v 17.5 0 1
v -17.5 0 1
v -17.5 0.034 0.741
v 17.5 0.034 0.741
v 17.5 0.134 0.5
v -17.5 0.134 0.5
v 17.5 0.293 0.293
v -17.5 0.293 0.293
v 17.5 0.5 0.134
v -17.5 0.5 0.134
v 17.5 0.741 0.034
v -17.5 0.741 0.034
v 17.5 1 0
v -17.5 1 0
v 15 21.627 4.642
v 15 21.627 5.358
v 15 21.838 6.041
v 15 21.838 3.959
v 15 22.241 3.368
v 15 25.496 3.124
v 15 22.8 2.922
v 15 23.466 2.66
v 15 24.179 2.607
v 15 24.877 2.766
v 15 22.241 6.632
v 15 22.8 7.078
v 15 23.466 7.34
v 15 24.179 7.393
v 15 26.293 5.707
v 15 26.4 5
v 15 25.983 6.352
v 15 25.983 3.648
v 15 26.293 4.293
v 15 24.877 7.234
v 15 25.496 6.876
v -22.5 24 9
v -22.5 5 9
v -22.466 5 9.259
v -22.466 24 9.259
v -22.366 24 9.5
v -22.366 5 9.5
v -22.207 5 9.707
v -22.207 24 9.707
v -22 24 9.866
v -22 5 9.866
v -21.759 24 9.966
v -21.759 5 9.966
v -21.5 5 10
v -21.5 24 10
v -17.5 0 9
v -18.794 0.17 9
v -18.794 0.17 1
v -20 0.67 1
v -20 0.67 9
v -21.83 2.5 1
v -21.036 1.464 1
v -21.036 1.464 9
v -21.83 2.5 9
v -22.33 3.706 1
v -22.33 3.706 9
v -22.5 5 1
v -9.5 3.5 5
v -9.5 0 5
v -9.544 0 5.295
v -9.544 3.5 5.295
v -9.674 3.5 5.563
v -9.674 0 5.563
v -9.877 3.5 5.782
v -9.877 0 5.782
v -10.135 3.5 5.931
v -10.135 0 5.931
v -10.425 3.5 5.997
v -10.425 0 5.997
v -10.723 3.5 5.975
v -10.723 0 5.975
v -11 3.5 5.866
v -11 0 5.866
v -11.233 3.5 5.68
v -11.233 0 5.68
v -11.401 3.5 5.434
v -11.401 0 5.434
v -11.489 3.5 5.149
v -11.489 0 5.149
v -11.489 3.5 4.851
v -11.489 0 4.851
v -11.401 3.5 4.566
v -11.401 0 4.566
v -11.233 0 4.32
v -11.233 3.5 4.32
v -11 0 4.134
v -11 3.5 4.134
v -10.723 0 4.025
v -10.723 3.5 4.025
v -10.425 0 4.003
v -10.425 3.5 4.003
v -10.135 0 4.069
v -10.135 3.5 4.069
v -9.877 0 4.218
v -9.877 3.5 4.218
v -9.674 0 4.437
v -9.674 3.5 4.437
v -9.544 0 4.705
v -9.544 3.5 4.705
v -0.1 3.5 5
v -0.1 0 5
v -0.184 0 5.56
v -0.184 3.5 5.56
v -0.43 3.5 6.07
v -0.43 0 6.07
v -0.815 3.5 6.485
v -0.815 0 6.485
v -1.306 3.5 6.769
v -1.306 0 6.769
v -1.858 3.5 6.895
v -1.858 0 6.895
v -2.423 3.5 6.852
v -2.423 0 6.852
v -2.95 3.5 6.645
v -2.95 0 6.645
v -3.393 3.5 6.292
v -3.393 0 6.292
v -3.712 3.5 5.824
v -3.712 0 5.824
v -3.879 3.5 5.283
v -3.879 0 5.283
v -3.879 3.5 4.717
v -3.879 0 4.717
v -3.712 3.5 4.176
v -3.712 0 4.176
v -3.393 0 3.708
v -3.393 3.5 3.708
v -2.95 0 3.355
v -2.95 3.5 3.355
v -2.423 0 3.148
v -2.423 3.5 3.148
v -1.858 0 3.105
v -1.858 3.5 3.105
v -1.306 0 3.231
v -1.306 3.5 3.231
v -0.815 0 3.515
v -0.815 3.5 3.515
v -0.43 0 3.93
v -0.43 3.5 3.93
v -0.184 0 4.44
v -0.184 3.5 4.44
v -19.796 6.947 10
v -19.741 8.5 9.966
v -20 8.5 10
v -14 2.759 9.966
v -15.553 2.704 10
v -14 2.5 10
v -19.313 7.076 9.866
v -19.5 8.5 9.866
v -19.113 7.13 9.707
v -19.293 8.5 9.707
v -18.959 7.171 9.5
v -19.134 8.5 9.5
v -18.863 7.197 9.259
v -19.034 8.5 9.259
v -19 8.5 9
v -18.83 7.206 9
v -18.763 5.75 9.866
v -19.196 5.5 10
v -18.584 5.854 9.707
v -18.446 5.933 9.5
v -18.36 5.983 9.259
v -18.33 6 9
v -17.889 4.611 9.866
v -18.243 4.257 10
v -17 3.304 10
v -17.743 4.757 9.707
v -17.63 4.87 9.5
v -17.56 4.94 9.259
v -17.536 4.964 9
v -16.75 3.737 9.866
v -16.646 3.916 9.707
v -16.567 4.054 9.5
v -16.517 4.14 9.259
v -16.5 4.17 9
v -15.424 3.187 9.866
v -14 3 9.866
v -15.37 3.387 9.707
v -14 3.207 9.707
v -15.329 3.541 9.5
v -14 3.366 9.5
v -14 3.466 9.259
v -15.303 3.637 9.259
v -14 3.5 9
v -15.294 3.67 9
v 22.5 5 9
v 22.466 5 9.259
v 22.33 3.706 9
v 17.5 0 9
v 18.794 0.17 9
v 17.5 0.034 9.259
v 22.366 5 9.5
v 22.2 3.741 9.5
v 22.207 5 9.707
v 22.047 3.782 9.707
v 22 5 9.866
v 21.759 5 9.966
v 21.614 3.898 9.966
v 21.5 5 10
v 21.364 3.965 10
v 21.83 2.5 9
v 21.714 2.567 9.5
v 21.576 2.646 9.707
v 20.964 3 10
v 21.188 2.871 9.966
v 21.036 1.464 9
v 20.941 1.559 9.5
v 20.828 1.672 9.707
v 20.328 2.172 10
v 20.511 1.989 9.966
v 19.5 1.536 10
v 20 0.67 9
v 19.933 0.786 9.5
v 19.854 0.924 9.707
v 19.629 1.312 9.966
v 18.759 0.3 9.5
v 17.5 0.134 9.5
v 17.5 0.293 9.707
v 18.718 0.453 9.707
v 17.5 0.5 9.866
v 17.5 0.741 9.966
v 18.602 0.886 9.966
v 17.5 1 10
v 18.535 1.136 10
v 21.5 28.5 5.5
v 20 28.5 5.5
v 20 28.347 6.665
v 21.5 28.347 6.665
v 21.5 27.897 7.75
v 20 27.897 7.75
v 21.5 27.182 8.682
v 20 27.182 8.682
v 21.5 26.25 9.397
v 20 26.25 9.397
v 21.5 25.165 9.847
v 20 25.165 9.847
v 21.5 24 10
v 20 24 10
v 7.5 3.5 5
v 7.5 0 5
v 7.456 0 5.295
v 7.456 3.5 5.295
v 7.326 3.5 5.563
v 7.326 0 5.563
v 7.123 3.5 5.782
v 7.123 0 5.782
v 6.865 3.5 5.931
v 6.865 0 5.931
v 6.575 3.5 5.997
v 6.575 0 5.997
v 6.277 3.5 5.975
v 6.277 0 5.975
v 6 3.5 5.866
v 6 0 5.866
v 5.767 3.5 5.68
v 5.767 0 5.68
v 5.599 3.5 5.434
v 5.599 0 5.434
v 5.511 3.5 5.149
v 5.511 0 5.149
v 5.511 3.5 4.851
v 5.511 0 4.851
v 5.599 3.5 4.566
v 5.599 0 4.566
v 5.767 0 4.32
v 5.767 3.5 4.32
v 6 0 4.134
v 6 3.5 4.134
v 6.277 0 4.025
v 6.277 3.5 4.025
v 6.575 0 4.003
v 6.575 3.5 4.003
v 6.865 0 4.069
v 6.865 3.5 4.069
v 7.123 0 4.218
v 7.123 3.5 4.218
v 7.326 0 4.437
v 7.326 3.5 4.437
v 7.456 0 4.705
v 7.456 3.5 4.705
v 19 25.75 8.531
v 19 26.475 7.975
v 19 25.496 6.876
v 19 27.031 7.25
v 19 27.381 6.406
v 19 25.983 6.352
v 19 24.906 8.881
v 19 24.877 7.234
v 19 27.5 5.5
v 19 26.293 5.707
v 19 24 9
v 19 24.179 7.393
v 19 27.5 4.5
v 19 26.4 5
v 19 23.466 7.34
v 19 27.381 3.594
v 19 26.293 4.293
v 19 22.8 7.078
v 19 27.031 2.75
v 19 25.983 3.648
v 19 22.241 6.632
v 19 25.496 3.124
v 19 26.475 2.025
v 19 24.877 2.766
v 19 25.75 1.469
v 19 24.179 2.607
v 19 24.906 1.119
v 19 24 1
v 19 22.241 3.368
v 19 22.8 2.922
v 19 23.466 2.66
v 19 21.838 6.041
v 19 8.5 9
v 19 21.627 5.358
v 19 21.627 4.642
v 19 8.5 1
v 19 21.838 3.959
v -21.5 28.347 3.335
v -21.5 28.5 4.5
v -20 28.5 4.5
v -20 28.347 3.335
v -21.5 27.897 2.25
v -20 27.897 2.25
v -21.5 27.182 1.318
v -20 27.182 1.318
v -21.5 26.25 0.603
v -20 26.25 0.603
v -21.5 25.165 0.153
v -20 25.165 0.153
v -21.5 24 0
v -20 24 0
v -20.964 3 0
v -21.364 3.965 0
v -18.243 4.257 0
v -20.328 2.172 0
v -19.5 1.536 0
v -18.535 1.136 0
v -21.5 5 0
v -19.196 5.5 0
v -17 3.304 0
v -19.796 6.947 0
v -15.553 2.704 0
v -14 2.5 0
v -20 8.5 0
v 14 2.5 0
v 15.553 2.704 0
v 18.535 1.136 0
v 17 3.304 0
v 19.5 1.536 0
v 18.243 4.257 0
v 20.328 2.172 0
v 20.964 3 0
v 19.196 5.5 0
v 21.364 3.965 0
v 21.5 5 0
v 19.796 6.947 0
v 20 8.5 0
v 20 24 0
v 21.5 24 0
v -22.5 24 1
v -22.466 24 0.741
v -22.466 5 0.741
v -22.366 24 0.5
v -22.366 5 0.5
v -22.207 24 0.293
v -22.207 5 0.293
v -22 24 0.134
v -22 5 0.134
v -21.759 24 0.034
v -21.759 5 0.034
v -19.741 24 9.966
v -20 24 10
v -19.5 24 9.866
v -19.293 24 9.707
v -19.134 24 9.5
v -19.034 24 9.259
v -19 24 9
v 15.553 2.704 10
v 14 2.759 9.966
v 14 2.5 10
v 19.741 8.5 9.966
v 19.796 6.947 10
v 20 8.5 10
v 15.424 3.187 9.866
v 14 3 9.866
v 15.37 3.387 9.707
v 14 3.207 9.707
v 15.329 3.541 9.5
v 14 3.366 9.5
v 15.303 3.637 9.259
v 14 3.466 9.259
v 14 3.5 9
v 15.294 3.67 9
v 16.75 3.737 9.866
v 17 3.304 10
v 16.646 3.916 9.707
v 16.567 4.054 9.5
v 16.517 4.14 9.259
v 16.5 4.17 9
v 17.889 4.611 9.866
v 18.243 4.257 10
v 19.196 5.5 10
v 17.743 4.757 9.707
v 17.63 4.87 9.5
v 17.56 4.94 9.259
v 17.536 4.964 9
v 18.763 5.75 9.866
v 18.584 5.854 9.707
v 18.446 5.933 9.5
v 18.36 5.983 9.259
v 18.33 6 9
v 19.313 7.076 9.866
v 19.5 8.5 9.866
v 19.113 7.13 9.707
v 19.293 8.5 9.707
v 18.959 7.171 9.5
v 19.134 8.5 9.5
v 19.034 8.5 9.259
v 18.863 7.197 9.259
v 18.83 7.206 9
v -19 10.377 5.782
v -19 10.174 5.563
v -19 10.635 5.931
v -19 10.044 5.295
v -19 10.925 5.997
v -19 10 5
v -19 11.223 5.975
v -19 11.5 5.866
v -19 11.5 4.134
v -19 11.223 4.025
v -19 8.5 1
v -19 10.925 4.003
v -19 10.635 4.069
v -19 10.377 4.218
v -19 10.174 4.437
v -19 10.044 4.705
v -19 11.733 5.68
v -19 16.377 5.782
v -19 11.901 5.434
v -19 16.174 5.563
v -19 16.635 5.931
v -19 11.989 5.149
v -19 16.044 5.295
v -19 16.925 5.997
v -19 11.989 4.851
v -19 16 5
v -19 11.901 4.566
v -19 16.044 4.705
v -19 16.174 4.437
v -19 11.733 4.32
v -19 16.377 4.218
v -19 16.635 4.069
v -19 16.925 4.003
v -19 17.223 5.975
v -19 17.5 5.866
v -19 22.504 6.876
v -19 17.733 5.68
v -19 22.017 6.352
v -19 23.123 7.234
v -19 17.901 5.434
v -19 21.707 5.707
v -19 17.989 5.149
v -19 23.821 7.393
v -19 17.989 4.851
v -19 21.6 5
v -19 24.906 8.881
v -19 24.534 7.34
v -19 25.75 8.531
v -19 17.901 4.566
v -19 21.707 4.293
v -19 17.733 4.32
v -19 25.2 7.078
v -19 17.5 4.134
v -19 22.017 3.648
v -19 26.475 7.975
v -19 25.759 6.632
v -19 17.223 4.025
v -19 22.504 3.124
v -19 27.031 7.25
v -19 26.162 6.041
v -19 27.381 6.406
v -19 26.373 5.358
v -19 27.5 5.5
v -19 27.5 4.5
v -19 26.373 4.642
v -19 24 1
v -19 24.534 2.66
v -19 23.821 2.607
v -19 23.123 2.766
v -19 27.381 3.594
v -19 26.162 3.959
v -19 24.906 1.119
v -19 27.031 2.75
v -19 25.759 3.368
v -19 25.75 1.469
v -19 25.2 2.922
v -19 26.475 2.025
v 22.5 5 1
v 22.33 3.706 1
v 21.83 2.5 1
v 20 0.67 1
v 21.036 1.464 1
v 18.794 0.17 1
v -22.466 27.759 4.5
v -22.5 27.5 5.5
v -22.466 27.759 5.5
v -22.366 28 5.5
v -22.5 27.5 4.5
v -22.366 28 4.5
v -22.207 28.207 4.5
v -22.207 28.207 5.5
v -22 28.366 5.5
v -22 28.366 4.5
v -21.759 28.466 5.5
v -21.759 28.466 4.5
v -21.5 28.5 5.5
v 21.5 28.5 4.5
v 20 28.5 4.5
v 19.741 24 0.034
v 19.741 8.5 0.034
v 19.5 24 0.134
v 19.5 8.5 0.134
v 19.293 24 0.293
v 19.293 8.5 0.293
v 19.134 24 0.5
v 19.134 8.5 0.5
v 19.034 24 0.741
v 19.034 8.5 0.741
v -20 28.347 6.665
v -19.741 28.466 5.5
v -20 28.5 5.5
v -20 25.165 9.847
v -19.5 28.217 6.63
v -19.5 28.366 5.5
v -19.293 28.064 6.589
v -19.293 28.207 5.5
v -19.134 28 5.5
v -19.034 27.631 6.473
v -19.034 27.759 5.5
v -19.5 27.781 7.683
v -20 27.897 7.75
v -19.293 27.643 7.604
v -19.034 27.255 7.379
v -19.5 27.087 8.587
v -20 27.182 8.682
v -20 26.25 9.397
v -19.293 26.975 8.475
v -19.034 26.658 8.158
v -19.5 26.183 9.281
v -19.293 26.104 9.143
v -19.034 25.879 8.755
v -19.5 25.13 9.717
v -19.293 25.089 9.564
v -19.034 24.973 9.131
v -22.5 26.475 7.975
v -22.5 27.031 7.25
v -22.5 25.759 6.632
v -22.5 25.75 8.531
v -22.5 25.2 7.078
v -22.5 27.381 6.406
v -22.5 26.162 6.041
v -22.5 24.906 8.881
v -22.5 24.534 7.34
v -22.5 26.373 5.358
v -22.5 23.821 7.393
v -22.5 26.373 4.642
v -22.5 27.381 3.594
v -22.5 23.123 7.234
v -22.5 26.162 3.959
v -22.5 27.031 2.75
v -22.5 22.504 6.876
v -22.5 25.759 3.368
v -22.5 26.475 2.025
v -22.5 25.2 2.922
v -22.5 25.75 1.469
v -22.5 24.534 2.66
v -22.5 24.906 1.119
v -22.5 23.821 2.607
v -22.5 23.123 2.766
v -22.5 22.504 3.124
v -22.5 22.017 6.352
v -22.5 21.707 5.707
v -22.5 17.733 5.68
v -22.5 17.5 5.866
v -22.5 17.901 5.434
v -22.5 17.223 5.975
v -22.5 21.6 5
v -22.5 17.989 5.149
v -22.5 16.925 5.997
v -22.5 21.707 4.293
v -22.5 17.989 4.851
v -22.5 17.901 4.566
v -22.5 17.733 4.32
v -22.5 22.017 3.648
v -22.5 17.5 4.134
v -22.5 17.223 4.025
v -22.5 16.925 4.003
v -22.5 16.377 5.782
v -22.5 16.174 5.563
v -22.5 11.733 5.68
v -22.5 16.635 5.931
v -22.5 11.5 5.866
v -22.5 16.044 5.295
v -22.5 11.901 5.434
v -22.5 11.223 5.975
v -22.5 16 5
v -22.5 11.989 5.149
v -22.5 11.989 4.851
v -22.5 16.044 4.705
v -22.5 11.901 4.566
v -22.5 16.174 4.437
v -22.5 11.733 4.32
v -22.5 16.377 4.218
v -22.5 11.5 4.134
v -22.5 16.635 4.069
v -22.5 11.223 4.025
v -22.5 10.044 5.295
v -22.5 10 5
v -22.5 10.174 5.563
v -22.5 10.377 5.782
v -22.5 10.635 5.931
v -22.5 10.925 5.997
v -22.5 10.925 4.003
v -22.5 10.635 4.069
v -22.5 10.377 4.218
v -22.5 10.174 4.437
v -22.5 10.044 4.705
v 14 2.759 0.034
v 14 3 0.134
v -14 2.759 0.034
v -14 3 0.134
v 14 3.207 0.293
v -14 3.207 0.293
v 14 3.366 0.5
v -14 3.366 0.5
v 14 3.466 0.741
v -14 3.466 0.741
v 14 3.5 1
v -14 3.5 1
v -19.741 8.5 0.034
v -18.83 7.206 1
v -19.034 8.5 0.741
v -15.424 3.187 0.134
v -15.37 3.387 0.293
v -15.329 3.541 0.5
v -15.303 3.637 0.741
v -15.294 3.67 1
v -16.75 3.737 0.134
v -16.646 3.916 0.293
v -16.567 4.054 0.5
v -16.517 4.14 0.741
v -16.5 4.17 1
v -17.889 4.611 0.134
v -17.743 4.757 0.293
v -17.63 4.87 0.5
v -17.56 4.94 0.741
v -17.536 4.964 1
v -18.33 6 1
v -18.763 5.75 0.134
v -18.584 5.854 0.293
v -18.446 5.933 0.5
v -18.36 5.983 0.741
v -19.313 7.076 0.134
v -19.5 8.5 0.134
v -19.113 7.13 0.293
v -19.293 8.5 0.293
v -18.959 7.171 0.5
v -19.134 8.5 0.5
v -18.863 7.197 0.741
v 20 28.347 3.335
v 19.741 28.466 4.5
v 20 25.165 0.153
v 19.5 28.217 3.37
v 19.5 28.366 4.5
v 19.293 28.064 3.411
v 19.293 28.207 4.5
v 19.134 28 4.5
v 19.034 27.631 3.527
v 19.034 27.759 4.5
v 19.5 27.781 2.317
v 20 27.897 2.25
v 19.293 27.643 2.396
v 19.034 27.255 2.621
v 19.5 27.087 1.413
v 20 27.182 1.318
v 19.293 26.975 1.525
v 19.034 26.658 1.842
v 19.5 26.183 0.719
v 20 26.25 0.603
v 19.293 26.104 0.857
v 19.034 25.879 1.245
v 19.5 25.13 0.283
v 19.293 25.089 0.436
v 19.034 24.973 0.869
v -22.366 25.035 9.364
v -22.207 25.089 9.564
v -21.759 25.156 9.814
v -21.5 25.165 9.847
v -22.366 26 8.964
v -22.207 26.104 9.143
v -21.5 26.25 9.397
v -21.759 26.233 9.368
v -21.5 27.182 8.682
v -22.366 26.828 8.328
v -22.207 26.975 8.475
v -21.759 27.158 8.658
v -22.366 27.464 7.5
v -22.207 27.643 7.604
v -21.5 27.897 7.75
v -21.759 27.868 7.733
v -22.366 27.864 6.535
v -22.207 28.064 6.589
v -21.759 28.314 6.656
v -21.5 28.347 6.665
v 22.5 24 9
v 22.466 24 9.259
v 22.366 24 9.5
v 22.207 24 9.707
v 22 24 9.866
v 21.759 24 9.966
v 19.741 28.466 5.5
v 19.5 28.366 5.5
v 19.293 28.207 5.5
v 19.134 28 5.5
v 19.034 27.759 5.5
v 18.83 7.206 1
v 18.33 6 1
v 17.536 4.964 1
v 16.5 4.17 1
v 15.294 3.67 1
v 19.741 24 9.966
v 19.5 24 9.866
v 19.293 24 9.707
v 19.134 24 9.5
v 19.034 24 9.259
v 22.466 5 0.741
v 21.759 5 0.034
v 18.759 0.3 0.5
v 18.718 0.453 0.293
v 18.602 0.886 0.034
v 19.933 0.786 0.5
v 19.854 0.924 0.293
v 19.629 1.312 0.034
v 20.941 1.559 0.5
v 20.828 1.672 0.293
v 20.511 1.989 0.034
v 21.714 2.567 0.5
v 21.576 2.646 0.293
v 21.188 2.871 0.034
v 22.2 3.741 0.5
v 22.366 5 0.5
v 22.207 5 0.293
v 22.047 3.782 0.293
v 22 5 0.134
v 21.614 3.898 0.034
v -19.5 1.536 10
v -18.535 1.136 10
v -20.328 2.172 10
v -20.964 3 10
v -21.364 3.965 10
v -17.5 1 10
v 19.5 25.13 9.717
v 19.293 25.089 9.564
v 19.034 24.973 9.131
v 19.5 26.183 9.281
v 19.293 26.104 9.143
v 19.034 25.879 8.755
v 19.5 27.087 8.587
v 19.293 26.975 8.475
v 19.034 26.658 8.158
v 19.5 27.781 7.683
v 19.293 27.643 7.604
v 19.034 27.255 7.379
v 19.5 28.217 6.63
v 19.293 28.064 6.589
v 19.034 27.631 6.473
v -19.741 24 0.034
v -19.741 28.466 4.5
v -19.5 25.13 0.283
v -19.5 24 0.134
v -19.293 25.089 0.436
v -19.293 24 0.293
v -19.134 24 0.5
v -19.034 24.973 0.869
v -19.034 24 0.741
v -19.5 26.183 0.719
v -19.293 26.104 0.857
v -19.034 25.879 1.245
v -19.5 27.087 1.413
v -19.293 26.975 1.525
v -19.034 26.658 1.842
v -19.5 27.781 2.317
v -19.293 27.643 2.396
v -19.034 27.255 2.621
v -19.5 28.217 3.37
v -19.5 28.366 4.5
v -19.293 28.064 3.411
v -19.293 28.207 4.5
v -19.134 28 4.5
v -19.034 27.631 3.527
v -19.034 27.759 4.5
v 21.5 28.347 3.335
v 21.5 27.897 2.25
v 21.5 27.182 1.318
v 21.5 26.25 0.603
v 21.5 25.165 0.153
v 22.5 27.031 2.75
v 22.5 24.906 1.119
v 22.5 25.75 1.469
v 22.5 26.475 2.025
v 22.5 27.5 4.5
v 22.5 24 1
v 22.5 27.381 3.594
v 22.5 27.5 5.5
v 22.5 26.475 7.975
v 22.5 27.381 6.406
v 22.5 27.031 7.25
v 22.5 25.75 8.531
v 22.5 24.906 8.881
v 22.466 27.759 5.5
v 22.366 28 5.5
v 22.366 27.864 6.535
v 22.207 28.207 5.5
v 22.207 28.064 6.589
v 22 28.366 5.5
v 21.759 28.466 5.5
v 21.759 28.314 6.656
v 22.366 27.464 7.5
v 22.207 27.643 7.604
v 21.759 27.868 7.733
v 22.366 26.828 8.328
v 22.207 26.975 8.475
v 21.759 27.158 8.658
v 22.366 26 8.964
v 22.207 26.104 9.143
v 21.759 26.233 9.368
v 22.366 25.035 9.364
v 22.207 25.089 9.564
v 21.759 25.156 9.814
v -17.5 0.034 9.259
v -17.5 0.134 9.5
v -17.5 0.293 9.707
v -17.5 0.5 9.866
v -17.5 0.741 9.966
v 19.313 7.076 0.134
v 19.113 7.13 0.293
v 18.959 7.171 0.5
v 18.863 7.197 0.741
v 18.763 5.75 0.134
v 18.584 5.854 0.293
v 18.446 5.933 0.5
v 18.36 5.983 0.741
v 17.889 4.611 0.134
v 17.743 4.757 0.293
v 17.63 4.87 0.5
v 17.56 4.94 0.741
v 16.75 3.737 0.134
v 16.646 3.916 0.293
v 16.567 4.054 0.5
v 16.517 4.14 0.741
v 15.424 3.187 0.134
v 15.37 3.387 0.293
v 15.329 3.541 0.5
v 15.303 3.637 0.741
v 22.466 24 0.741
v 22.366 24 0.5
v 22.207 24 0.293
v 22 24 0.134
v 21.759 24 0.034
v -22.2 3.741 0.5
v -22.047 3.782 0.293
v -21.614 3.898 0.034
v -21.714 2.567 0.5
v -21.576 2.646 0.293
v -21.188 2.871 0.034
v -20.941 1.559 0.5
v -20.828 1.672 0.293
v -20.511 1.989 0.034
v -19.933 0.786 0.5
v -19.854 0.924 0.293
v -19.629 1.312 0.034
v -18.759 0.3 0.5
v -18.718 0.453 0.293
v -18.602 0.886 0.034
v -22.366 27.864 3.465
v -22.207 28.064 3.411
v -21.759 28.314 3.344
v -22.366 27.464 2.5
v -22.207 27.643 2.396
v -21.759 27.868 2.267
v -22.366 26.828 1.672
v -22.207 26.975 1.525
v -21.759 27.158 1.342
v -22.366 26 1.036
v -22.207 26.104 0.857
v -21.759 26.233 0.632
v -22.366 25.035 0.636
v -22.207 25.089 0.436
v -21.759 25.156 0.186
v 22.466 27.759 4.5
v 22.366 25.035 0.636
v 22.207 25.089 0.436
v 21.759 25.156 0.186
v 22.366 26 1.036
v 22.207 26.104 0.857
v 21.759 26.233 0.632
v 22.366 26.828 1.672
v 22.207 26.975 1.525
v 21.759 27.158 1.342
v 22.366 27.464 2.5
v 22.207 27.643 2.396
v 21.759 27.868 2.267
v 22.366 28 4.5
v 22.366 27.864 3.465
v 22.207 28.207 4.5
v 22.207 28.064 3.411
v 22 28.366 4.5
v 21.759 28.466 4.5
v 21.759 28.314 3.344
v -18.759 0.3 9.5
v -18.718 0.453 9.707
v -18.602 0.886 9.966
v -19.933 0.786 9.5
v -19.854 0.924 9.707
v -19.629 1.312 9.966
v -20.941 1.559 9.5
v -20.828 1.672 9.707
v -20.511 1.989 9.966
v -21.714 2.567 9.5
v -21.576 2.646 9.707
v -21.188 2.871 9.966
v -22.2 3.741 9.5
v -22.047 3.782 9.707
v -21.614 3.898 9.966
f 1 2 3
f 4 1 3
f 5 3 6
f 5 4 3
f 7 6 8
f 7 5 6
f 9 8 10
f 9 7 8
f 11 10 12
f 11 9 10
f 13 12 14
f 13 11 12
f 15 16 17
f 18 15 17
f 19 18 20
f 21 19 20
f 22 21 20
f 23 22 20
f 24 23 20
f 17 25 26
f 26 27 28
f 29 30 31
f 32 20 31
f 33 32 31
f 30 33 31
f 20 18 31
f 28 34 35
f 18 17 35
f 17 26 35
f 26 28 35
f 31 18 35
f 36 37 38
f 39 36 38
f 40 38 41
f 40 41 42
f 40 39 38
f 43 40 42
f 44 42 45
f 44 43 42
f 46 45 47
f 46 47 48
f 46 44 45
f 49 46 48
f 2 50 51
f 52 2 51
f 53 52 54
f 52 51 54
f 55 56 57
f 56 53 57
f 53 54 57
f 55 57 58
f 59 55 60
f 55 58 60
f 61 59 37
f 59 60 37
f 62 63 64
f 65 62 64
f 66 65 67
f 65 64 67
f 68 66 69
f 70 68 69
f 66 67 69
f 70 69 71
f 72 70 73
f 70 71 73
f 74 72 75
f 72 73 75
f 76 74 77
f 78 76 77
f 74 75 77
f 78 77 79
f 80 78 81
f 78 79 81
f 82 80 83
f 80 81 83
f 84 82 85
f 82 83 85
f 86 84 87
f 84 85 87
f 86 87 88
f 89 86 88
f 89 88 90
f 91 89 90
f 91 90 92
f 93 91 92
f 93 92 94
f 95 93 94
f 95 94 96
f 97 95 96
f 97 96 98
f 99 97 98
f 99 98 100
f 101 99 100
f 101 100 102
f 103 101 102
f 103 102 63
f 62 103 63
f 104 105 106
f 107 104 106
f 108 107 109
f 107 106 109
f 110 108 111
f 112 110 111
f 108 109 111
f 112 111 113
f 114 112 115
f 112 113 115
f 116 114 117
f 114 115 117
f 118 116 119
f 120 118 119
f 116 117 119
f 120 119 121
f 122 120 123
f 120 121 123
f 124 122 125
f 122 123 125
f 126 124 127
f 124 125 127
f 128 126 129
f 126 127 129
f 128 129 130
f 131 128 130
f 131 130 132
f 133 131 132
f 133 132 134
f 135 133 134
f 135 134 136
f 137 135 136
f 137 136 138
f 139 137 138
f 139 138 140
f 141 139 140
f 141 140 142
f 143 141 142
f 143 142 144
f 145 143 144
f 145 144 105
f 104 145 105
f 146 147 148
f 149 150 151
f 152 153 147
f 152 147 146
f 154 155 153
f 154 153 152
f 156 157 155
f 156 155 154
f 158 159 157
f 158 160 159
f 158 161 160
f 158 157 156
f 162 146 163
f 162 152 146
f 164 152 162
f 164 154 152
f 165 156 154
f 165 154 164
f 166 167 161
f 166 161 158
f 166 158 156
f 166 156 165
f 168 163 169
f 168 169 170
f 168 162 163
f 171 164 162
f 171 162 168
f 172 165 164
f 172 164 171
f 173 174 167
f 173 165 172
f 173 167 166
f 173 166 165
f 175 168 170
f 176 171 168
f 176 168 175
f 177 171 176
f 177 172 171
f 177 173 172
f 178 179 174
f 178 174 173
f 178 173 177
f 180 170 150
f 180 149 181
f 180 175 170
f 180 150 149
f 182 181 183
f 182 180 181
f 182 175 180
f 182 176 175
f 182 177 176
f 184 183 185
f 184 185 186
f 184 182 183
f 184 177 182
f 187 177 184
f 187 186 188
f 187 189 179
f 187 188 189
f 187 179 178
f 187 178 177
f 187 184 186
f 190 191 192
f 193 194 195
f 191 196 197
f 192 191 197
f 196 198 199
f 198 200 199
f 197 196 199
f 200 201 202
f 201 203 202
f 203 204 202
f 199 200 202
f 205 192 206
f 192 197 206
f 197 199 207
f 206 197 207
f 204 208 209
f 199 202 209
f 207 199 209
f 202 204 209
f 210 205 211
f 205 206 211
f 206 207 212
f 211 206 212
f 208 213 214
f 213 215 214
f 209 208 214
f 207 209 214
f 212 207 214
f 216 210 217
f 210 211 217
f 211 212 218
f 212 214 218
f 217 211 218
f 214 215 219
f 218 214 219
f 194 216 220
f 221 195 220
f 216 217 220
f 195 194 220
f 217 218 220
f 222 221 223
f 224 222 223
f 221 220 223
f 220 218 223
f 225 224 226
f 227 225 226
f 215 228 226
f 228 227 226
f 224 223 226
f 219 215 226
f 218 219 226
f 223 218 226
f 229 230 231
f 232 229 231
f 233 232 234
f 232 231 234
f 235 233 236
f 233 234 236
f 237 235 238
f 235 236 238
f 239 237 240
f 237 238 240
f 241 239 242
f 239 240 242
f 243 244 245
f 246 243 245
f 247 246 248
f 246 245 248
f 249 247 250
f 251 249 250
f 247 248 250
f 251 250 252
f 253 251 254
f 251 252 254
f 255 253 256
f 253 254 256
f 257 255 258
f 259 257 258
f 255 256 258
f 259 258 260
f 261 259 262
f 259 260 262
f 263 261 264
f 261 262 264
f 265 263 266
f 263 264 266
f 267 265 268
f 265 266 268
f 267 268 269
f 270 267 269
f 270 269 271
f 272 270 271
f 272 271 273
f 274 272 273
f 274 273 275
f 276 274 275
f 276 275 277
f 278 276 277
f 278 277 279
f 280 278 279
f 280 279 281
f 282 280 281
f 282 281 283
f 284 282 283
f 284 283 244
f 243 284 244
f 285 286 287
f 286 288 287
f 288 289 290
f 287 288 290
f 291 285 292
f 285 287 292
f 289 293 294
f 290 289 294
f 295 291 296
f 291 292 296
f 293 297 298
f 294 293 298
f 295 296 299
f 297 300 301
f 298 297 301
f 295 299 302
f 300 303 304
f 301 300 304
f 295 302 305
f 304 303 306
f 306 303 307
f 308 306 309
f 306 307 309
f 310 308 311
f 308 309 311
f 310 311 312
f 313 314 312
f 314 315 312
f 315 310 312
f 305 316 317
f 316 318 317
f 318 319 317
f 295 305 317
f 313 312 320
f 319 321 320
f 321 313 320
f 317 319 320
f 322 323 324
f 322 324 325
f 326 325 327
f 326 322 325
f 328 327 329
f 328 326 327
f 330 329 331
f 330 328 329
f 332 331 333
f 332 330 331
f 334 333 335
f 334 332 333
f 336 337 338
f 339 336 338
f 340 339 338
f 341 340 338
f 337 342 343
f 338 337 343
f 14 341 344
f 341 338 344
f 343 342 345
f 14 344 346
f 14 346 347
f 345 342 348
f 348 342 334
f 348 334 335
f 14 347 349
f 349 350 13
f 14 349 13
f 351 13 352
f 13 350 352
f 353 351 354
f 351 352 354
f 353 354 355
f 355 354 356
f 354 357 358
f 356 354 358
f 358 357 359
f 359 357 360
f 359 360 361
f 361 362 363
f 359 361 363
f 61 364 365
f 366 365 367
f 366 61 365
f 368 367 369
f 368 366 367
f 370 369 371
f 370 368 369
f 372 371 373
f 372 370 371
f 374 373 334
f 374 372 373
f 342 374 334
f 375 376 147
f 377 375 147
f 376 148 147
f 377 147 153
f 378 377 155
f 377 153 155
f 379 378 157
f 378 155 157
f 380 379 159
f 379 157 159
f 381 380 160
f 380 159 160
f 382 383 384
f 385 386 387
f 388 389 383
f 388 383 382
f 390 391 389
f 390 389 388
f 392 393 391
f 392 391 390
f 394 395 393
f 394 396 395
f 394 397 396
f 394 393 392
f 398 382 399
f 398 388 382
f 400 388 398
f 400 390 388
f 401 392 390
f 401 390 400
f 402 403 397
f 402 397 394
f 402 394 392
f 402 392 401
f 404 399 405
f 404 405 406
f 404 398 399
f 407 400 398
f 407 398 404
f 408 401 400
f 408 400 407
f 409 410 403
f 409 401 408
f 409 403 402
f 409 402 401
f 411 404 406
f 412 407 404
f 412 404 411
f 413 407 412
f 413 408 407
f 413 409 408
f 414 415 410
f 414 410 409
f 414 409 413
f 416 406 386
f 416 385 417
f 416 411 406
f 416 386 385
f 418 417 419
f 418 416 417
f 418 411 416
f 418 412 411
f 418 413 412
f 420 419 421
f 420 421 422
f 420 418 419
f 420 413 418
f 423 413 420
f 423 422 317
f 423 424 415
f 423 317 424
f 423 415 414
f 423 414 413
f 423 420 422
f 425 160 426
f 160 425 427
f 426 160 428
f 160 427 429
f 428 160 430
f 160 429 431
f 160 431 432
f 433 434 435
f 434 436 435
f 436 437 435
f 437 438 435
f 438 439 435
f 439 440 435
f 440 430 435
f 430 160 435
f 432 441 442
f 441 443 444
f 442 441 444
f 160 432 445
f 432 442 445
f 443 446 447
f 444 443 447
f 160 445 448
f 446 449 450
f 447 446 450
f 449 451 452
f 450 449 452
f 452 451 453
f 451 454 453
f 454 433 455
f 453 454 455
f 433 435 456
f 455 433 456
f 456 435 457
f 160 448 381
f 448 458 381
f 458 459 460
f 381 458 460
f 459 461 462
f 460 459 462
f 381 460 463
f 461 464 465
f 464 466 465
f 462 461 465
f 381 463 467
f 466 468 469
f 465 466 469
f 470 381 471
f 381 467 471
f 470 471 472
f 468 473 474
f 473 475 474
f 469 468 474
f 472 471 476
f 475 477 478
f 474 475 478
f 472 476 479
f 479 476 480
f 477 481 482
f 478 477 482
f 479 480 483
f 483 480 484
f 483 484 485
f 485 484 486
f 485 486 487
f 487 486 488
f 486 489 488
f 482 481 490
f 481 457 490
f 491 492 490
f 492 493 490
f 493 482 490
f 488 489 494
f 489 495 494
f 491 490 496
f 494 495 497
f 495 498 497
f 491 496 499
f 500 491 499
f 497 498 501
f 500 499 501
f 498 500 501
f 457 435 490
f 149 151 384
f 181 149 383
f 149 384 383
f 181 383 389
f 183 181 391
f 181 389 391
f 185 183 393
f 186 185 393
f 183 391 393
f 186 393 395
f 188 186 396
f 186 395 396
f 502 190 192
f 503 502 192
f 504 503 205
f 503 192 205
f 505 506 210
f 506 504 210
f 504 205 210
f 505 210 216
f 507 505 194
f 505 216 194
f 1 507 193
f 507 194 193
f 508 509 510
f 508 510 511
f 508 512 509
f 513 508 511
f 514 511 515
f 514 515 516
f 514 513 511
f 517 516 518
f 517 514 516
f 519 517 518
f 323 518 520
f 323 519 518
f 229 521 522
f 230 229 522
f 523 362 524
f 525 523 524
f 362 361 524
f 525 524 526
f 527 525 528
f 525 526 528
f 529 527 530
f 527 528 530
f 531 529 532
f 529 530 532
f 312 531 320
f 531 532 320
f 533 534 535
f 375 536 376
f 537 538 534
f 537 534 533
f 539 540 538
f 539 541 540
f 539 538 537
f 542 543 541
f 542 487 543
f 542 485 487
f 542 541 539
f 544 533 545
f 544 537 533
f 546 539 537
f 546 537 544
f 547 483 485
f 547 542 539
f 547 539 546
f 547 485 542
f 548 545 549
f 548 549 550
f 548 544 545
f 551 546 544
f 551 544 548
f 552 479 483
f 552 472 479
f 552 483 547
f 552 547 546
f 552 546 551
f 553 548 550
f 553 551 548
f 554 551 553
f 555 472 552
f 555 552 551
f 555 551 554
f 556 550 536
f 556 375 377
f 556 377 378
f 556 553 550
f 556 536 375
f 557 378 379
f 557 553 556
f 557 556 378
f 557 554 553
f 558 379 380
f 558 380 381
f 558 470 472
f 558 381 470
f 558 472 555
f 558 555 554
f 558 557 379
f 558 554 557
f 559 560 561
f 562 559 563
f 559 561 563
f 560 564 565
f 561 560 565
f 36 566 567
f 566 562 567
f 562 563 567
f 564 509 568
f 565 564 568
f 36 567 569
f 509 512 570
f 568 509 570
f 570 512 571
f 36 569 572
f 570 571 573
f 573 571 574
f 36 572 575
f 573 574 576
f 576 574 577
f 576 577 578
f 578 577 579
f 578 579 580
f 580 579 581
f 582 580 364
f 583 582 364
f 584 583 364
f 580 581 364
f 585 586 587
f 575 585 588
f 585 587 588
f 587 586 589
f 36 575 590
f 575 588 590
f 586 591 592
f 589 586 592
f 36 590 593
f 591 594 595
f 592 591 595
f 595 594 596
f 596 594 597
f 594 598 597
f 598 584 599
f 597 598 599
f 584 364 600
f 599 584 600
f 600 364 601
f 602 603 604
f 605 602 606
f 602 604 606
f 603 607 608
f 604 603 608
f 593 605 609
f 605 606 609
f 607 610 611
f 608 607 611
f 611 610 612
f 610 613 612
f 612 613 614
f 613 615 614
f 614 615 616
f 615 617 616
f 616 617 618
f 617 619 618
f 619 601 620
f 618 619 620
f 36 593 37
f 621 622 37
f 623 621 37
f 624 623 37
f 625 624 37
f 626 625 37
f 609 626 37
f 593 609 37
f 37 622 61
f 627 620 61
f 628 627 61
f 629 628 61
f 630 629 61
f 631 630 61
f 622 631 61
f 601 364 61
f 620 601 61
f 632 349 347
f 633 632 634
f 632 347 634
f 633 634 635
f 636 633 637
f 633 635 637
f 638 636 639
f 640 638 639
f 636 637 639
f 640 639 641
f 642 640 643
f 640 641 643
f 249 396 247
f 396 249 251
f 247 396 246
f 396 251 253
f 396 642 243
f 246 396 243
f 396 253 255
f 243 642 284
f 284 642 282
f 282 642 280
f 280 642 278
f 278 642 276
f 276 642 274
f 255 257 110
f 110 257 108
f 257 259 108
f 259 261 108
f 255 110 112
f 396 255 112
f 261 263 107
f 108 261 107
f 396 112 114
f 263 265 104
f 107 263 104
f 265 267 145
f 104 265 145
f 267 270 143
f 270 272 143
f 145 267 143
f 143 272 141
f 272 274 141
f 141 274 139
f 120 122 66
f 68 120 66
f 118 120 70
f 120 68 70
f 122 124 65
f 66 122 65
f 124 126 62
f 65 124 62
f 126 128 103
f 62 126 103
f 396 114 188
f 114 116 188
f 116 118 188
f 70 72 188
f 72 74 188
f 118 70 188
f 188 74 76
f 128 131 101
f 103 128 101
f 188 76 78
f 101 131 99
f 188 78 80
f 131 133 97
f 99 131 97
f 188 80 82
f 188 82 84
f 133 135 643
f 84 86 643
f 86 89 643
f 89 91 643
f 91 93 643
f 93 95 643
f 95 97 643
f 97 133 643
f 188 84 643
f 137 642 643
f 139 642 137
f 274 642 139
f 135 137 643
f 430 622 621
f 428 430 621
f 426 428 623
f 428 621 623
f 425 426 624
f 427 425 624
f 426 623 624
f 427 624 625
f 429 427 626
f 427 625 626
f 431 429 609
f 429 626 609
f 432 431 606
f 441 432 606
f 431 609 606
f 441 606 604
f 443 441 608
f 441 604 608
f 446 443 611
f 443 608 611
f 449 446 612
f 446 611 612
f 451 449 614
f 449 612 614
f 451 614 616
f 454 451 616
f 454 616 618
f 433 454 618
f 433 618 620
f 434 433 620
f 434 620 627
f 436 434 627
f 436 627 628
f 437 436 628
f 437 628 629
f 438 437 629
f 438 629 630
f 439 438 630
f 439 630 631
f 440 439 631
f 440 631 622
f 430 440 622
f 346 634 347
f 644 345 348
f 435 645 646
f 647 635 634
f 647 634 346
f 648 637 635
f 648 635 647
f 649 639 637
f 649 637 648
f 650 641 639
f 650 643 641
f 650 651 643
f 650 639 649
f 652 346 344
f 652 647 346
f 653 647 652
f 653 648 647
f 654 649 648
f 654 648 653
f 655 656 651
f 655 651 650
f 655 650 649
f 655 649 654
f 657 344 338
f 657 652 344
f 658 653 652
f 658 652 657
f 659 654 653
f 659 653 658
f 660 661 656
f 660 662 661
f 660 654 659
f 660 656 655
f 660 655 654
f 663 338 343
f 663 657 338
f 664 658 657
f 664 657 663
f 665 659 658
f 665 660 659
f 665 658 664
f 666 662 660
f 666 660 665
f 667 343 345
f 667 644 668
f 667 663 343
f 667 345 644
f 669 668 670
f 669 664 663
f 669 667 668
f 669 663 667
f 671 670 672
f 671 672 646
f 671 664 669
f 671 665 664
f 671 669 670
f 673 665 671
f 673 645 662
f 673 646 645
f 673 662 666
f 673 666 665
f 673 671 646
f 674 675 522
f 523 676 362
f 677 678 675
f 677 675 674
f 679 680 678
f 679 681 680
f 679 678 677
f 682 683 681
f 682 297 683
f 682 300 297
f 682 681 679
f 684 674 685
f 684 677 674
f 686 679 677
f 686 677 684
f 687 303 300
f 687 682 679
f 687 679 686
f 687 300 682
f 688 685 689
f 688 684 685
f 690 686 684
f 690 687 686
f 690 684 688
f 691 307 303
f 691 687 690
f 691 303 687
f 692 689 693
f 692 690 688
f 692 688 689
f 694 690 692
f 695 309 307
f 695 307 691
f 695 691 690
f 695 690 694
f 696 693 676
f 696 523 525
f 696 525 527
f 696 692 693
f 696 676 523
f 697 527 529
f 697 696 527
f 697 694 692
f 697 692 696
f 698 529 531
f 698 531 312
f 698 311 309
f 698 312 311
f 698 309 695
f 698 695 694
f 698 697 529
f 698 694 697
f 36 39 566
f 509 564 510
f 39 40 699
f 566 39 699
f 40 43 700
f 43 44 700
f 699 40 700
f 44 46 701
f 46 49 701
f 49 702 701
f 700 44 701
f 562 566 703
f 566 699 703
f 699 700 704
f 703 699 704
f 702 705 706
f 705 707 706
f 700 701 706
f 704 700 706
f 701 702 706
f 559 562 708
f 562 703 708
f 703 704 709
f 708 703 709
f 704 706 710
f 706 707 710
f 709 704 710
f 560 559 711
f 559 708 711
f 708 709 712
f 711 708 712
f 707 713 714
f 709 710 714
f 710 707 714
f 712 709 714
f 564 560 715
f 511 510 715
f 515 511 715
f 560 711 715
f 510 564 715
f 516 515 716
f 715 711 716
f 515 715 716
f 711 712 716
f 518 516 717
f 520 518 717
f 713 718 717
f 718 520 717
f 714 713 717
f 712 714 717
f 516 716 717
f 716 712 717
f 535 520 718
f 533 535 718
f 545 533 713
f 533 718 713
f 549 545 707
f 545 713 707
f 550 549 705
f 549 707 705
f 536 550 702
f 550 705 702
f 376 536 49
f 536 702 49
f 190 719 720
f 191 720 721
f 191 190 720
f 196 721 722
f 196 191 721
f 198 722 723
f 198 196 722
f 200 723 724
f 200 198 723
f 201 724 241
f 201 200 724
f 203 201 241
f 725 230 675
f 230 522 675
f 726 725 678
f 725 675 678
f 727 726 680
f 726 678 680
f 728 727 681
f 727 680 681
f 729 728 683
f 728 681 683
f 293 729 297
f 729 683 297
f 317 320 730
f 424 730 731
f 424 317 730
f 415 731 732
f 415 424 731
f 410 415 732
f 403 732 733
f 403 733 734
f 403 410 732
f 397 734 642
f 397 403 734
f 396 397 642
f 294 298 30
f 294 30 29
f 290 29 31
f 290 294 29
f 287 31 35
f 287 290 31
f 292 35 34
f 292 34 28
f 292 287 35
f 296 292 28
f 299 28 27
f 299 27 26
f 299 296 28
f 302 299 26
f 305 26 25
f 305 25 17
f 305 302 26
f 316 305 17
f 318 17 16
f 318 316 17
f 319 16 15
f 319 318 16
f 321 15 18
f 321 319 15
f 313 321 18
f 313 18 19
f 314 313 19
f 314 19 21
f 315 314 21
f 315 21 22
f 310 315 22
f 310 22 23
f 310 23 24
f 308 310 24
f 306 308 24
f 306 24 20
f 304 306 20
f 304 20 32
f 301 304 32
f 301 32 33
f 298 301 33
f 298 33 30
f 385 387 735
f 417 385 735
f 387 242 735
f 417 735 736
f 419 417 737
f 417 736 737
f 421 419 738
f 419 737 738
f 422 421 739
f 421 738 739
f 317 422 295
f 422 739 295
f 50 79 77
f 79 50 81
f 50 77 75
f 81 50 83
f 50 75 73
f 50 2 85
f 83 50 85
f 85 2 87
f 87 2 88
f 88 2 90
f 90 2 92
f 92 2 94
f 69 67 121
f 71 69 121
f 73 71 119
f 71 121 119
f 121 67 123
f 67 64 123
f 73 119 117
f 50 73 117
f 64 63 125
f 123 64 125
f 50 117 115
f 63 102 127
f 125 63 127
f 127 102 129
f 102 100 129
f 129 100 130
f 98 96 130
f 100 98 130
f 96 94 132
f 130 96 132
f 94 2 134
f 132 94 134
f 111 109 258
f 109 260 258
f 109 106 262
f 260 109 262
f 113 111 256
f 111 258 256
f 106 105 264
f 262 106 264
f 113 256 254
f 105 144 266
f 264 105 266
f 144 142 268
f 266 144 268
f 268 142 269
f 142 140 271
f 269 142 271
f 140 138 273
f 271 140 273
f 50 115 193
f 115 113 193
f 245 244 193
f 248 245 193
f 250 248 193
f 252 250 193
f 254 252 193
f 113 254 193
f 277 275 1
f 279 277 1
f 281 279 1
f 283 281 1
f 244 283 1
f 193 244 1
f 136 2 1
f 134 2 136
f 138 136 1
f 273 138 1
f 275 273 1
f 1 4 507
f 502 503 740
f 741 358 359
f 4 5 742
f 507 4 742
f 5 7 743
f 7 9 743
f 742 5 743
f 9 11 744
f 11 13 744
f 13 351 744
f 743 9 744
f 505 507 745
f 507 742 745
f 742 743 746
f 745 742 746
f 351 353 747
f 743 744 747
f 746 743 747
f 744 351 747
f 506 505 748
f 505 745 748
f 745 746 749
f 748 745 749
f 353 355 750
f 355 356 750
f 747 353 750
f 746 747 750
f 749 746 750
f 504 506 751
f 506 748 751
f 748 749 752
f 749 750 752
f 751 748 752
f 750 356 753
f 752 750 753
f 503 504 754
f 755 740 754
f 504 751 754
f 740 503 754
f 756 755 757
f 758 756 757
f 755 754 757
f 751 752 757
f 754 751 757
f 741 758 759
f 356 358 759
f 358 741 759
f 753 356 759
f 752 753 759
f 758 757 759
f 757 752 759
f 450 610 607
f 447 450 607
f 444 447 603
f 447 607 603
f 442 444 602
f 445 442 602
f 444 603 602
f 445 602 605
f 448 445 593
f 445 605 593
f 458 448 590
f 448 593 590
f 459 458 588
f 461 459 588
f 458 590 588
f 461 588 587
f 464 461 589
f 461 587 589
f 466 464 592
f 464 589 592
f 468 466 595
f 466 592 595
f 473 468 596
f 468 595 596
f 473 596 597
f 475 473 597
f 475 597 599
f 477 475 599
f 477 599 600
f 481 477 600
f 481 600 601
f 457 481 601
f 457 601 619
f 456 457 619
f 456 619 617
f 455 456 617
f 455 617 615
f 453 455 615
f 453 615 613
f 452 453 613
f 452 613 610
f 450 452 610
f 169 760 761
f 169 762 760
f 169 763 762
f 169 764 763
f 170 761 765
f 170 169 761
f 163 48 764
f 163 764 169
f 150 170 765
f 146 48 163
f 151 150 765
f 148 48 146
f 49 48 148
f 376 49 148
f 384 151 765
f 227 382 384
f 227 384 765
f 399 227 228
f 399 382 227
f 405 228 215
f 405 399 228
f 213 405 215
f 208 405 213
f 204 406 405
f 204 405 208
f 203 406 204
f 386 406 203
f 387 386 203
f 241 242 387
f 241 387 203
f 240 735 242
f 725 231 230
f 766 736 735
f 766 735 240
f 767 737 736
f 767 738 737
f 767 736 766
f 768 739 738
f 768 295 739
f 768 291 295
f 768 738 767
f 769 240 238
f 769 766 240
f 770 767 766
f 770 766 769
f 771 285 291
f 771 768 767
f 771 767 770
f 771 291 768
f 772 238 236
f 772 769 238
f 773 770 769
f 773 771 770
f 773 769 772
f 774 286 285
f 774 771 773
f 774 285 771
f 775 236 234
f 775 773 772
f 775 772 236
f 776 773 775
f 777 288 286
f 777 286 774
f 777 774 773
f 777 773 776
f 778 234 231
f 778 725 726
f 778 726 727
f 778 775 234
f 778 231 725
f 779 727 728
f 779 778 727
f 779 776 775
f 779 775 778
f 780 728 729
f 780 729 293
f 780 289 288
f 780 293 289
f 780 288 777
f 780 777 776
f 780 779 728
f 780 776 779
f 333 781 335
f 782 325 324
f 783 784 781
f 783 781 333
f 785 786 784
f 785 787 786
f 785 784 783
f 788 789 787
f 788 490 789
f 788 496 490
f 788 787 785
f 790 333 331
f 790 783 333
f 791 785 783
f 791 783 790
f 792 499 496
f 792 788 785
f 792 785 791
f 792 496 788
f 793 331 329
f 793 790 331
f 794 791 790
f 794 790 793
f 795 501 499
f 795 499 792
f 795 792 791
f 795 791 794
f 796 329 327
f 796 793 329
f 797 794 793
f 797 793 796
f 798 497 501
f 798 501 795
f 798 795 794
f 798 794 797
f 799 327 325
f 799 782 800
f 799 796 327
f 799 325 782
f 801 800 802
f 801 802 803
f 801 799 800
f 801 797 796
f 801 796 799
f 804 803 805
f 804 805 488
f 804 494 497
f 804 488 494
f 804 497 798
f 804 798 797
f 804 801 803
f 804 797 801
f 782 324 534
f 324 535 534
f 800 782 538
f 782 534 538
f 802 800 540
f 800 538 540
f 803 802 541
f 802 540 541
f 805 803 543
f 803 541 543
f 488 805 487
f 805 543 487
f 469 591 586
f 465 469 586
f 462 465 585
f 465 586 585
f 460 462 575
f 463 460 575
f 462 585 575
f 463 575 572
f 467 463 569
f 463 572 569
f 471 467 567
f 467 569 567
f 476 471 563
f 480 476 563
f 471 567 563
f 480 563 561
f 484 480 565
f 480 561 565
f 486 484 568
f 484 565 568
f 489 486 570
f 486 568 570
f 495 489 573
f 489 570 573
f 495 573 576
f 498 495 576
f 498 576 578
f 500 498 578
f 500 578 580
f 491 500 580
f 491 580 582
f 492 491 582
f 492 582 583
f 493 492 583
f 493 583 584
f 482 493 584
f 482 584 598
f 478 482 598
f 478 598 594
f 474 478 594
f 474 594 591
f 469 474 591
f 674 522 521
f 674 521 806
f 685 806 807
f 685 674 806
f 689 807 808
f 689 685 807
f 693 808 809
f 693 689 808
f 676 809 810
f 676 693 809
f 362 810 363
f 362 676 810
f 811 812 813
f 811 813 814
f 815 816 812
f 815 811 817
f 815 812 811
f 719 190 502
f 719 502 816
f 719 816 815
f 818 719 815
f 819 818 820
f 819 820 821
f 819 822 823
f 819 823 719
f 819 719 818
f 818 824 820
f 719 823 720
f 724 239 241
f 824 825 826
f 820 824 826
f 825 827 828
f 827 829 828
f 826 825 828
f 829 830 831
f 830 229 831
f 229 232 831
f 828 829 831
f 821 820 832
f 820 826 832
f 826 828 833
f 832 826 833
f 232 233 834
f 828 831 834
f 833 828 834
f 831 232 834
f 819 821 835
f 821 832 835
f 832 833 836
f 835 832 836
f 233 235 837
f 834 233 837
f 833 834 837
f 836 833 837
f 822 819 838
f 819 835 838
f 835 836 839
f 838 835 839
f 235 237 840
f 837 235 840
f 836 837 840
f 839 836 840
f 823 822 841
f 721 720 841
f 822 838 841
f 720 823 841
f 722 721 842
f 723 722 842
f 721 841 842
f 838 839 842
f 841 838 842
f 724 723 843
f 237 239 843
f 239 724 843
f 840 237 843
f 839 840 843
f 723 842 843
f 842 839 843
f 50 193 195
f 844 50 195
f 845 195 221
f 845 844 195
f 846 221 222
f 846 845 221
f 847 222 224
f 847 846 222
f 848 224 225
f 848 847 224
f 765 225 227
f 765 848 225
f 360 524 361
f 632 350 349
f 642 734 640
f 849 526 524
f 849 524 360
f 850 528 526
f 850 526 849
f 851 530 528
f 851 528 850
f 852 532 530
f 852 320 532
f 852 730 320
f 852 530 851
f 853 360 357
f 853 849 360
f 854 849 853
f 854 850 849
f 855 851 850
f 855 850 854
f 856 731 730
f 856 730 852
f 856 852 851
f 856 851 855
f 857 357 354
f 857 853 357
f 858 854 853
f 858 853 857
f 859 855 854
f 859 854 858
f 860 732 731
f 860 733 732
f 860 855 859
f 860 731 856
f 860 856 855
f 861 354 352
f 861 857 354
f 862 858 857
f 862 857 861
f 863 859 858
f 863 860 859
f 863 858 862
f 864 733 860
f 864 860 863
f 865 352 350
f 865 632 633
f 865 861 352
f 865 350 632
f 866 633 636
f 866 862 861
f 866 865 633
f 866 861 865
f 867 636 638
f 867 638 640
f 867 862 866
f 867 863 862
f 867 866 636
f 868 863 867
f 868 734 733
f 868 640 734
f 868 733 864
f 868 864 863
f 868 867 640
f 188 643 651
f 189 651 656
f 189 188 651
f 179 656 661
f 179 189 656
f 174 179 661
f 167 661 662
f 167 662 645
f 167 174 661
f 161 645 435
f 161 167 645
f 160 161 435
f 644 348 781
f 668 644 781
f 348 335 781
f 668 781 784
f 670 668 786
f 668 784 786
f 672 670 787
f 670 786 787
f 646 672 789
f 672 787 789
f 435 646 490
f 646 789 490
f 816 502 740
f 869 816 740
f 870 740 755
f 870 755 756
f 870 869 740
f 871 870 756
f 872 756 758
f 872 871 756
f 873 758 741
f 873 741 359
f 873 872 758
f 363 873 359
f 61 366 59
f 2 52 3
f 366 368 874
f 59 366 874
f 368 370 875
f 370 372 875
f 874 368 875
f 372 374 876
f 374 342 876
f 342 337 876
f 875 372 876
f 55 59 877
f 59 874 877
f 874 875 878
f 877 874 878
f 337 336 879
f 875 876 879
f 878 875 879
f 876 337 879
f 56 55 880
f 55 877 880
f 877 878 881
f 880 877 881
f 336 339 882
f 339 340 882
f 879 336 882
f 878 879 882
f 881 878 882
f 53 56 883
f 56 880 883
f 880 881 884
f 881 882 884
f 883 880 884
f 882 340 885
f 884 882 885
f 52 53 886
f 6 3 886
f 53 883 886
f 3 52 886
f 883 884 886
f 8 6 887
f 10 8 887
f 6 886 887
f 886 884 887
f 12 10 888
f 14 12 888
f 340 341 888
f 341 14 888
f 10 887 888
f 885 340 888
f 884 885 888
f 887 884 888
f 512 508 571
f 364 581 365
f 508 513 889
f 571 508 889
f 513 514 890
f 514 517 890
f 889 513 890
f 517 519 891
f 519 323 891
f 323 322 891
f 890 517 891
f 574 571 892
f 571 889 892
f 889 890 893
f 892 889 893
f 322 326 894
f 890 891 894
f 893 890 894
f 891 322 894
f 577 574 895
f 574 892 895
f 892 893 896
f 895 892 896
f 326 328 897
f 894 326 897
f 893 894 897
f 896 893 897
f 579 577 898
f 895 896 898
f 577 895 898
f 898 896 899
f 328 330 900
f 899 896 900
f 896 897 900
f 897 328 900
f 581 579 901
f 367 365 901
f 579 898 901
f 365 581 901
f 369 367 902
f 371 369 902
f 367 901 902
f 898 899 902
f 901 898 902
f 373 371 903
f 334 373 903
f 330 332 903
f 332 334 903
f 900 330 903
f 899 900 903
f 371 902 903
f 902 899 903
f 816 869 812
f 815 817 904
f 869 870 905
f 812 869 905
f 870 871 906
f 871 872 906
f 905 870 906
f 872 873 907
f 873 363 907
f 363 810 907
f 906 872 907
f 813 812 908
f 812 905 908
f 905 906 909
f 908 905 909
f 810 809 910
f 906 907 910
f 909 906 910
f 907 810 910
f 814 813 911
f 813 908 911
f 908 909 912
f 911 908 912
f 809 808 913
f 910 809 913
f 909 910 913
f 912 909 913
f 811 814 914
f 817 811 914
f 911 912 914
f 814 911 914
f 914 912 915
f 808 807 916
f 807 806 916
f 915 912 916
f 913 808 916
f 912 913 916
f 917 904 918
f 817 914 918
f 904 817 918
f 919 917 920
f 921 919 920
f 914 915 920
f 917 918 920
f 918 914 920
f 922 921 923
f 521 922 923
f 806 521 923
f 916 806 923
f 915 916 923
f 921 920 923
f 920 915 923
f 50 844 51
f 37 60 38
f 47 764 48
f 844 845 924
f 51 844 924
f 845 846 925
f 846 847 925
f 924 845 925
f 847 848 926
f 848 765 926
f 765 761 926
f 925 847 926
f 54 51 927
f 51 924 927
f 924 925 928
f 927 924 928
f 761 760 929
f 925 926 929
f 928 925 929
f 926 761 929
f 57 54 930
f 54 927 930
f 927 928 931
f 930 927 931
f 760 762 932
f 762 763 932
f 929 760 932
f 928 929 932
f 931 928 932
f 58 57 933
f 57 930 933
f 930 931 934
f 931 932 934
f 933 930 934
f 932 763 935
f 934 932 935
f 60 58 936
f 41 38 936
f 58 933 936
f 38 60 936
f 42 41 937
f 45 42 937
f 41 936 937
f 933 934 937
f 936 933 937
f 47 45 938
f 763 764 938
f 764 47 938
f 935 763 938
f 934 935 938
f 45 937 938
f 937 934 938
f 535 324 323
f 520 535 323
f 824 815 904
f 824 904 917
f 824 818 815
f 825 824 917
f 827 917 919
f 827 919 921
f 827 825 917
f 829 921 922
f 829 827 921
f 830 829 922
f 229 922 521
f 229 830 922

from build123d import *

# Parameters (mm, degrees)
F1_DEPTH       = 10
F2_R           = 4.5
F3_R           = 1
F4_DEPTH       = 4
F5_R           = 2.4
F6_DEPTH       = 7.5
F3_R_2         = 2.4
F7_DEPTH       = 25
F7_DEPTH_BACK  = 25
F8_R           = 5
F9_R           = 1
F9_R_2         = 1.9
F10_DEPTH      = 25
F10_DEPTH_BACK = 25
F11_R          = 1


with BuildPart() as f1:
    # F0 (on Top) → F1 (new body)
    with BuildSketch(Plane.XY):
        Polygon((-22.5, 0), (0, 0), (22.5, 0), (22.5, 28.5), (19, 28.5), (19, 3.5), (0, 3.5), (-19, 3.5), (-19, 28.5), (-22.5, 28.5), align=None)
    extrude(amount=F1_DEPTH)

    # F2
    f2_edges = [f1.edges().sort_by_distance(p)[0] for p in [
        (-20.75, 28.5, 10),
        (-20.75, 28.5, 0),
        (20.75, 28.5, 10),
        (20.75, 28.5, 0),
    ]]
    fillet(f2_edges, radius=F2_R)

    # F3 (on face) → F4 (cut)
    with BuildSketch(Plane(origin=(-22.5, 0, 0), x_dir=(0, -1, 0), z_dir=(-1, 0, 0))):
        with Locations((-17, 5)):
            Circle(F3_R)
        with Locations((-11, 5)):
            Circle(F3_R)
    extrude(amount=-F4_DEPTH, mode=Mode.SUBTRACT)

    # F5 (on face) → F6 (join)
    with BuildSketch(Plane.YZ.offset(22.5)):
        with Locations((24, 5)):
            Circle(F5_R)
    extrude(amount=-F6_DEPTH)

    # F3 (on face) → F7 (cut, two sides)
    with BuildSketch(Plane(origin=(-22.5, 0, 0), x_dir=(0, -1, 0), z_dir=(-1, 0, 0))) as f7_sk:
        with Locations((-24, 5)):
            Circle(F3_R_2)
    extrude(amount=-F7_DEPTH, mode=Mode.SUBTRACT)
    extrude(f7_sk.sketch, amount=-F7_DEPTH_BACK, mode=Mode.SUBTRACT)

    # F8
    f8_edges = [f1.edges().sort_by_distance(p)[0] for p in [
        (-22.5, 0, 5),
        (22.5, 0, 5),
        (-19, 3.5, 5),
        (19, 3.5, 5),
    ]]
    fillet(f8_edges, radius=F8_R)

    # F9 (on face) → F10 (cut, two sides)
    with BuildSketch(Plane.XZ) as f10_sk:
        with Locations((-10.5, 5)):
            Circle(F9_R)
        with Locations((-2, 5)):
            Circle(F9_R_2)
        with Locations((6.5, 5)):
            Circle(F9_R)
    extrude(amount=-F10_DEPTH, mode=Mode.SUBTRACT)
    extrude(f10_sk.sketch, amount=-F10_DEPTH_BACK, mode=Mode.SUBTRACT)

    # F11
    f11_edges = [f1.edges().sort_by_distance(p)[0] for p in [
        (22.5, 14.5, 0),
        (21.035534, 1.464466, 0),
        (20.75, 24, 0),
        (0, 0, 0),
        (19, 16.25, 0),
        (-21.035534, 1.464466, 0),
        (17.535534, 4.964466, 0),
        (-22.5, 14.5, 0),
        (0, 3.5, 0),
        (-20.75, 24, 0),
        (-17.535534, 4.964466, 0),
        (-19, 16.25, 0),
    ]]
    fillet(f11_edges, radius=F11_R)


solid = f1.part
